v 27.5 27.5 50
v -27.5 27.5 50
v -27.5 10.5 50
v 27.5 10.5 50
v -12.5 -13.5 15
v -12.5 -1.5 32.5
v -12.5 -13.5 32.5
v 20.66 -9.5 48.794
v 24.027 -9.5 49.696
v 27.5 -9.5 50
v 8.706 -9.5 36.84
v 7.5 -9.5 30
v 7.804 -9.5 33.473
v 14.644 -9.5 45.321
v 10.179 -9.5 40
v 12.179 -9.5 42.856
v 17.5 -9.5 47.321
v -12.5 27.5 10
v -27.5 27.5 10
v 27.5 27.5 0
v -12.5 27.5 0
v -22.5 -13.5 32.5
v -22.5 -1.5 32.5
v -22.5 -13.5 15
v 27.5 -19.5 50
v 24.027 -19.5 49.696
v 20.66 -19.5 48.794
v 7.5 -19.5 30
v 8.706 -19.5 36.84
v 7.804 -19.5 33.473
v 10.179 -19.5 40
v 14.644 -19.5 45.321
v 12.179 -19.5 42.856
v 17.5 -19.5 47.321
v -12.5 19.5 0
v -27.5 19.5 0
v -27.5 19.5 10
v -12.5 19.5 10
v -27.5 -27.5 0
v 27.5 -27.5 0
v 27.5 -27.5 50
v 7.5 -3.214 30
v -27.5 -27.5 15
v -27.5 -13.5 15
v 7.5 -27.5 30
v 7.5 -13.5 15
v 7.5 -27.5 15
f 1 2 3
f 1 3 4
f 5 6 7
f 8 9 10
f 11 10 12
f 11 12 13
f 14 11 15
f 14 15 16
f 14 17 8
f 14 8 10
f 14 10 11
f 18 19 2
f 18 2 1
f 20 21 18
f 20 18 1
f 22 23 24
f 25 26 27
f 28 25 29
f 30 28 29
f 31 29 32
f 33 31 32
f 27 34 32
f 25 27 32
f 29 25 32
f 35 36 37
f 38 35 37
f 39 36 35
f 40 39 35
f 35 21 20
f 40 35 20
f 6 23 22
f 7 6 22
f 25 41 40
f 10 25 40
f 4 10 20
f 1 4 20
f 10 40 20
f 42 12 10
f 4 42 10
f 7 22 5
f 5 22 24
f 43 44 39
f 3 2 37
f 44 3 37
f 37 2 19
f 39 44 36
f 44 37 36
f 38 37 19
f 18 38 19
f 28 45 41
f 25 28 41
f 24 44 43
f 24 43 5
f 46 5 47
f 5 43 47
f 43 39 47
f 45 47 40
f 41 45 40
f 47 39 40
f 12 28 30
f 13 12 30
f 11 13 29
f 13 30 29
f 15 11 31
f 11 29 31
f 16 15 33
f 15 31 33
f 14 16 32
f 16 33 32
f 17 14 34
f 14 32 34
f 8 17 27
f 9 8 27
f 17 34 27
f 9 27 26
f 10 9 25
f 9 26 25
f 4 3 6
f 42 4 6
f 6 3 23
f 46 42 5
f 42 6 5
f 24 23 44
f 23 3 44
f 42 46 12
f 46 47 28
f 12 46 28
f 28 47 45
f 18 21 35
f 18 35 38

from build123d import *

# Parameters (mm, degrees)
SKETCH_1_W          = 55
SKETCH_1_H          = 55
EXTRUDE_1_DEPTH     = 50
CUT_EXTRUDE_1_DEPTH = 38
EXTRUDE_2_REACH     = 81.254
EXTRUDE_START       = -5
EXTRUDE_3_DEPTH     = 10
EXTRUDE_START_2     = -8
EXTRUDE_4_DEPTH     = 10
SKETCH_6_W          = 10
SKETCH_6_H          = 8
CUT_EXTRUDE_2_DEPTH = 15


with BuildPart() as part:
    # Эскиз1 → Бобышка-Вытянуть1 (new body)
    with BuildSketch(Plane.XY):
        Rectangle(SKETCH_1_W, SKETCH_1_H)
    extrude(amount=EXTRUDE_1_DEPTH)

    # Эскиз2 → Вырез-Вытянуть1 (cut)
    with BuildSketch(Plane.XZ.offset(27.5)):
        Polygon((-27.5, 15), (7.5, 15), (7.5, 30), (27.5, 50), (-27.5, 50), align=None)
    extrude(amount=-CUT_EXTRUDE_1_DEPTH, mode=Mode.SUBTRACT)

    # Бобышка-Вытянуть2: up to this face of the body (flat: up to its plane)
    extrude_2_end = Plane(part.part.faces().sort_by_distance((27.5, 0, 25))[0])
    # Эскиз3 → Бобышка-Вытянуть2 (add, up to the picked face)
    with BuildSketch(Plane.ZY.offset(27.5), mode=Mode.PRIVATE) as extrude_2_sk1:
        Polygon((50, 10.5), (15, -13.5), (15, 10.5), align=None)
    extrude_2_tool1 = split(extrude(extrude_2_sk1.sketch, amount=-EXTRUDE_2_REACH, mode=Mode.PRIVATE), bisect_by=extrude_2_end, keep=Keep.BOTH, mode=Mode.PRIVATE)
    add(extrude_2_tool1.solids().sort_by(Axis((-27.5, 2.5, 26.666667), (1, 0, 0)))[0])

    # Эскиз4 → Бобышка-Вытянуть3 (add)
    with BuildSketch(Plane.ZY.offset(27.5).offset(EXTRUDE_START)):
        Polygon((32.5, -1.5), (32.5, -13.5), (15, -13.5), align=None)
    extrude(amount=-EXTRUDE_3_DEPTH)

    # Эскиз5 → Бобышка-Вытянуть4 (add)
    with BuildSketch(Plane.XZ.offset(27.5).offset(EXTRUDE_START_2)):
        with BuildLine():
            Line((27.5, 50), (7.5, 30))
            ThreePointArc((7.5, 30), (13.357864376, 44.142135624), (27.5, 50))
        make_face()
    extrude(amount=-EXTRUDE_4_DEPTH)

    # Эскиз6 → Вырез-Вытянуть2 (cut)
    with BuildSketch(Plane.ZY.offset(27.5)):
        with Locations((5, 23.5)):
            Rectangle(SKETCH_6_W, SKETCH_6_H)
    extrude(amount=-CUT_EXTRUDE_2_DEPTH, mode=Mode.SUBTRACT)


solid = part.part
